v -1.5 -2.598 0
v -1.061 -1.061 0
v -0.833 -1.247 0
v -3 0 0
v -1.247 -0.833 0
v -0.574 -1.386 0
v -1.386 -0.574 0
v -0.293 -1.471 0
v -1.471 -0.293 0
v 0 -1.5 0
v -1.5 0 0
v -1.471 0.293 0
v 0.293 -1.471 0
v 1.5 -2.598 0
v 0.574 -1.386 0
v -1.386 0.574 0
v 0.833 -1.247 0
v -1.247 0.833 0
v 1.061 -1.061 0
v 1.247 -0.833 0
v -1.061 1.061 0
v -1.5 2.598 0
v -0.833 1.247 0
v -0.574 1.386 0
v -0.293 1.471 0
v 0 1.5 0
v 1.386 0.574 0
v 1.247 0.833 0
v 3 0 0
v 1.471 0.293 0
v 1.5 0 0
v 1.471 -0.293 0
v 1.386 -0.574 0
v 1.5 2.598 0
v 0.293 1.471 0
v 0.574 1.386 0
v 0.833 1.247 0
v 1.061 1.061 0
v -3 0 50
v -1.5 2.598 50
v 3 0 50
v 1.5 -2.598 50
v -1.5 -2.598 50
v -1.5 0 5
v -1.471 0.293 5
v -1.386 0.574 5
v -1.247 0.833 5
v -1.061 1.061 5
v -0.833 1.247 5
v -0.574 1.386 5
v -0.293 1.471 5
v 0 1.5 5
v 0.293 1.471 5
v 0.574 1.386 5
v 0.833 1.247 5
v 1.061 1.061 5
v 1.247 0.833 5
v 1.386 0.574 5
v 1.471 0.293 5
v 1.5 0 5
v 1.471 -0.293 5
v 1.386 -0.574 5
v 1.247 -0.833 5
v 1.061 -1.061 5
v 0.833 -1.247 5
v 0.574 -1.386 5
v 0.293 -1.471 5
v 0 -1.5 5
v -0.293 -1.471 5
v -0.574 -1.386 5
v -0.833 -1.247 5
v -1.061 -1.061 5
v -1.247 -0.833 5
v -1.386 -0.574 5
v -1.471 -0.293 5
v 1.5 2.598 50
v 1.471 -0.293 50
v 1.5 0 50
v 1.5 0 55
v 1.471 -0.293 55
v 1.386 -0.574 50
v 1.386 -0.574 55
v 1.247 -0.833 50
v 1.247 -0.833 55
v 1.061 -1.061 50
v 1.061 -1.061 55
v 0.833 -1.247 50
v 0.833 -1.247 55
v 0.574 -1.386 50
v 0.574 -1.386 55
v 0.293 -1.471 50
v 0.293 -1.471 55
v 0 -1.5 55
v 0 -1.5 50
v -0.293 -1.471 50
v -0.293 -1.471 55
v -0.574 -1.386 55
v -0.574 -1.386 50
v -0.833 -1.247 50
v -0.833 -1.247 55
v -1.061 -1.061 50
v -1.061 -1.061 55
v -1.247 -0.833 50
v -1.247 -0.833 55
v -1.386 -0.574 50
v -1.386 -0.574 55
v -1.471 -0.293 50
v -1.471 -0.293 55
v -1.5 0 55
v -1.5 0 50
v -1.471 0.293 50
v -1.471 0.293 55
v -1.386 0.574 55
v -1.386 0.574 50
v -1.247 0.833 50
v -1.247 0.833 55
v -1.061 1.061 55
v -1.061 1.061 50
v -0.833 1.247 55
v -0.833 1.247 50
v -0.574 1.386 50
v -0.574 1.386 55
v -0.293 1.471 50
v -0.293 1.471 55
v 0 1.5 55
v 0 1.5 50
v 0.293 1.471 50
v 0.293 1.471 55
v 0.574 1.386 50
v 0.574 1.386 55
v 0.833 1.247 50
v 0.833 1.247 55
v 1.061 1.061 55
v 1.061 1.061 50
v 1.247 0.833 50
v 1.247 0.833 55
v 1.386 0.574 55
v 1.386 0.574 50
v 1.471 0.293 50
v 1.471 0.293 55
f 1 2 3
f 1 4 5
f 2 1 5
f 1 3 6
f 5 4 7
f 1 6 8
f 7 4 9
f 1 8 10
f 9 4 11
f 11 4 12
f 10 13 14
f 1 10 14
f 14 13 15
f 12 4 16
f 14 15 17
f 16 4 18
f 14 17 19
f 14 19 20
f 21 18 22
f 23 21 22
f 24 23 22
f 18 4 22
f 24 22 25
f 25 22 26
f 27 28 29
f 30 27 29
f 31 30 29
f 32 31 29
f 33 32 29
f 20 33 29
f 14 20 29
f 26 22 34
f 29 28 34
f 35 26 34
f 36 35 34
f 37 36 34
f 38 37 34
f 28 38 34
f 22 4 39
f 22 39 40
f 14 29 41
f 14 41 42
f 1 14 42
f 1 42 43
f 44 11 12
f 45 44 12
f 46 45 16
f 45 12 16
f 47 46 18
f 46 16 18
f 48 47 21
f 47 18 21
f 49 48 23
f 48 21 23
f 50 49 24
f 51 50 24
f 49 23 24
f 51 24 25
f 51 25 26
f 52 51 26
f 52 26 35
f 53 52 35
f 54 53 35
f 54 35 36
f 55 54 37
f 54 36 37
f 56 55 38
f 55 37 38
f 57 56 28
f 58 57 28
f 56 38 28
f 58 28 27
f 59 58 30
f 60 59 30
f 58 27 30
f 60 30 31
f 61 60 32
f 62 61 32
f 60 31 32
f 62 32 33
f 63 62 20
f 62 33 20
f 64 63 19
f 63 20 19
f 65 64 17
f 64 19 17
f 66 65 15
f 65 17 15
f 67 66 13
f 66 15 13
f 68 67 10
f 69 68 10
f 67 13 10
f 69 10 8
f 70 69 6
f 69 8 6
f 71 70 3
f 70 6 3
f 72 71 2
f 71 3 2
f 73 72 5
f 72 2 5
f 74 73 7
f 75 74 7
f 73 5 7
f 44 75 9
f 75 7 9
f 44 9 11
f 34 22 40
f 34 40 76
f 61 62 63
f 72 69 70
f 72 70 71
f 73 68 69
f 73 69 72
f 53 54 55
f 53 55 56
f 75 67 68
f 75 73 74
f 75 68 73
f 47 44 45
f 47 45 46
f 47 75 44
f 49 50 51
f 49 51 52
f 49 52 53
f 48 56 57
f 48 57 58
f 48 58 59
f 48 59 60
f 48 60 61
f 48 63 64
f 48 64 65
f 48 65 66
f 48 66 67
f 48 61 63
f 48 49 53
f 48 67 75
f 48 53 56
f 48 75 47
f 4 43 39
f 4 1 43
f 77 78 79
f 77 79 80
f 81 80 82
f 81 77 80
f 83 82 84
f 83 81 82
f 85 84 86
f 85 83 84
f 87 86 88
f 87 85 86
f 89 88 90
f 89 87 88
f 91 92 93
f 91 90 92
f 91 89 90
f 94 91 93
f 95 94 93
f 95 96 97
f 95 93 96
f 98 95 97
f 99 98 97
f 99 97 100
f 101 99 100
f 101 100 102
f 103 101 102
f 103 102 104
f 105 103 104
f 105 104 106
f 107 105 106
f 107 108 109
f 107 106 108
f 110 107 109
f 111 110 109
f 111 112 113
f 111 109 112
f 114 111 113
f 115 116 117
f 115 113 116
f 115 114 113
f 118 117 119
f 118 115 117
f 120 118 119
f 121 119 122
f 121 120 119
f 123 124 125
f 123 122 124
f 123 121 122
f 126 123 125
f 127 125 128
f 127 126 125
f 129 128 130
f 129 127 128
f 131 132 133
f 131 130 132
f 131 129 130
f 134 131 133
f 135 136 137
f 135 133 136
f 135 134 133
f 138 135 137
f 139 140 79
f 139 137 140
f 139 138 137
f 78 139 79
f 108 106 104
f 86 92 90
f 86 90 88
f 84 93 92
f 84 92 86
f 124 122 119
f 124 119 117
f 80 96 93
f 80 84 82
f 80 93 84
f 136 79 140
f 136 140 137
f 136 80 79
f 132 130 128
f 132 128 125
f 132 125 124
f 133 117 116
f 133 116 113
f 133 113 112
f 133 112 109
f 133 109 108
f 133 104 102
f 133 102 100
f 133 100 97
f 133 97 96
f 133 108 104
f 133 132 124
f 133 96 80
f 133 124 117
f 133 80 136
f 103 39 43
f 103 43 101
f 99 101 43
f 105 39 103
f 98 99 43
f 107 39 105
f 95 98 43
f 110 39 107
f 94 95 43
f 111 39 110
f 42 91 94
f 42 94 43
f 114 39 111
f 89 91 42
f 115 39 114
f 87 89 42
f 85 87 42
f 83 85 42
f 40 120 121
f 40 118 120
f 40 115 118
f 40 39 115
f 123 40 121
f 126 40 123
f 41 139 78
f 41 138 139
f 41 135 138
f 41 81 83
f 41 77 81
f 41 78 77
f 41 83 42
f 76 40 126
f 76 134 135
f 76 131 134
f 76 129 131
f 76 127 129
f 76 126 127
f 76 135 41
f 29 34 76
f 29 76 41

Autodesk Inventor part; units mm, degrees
ref_plane "YZ Plane" through (0, 0, 0) normal (1, 0, 0) x (0, 1, 0)
ref_plane "XZ Plane" through (0, 0, 0) normal (0, 1, 0) x (-1, 0, 0)
ref_plane "XY Plane" through (0, 0, 0) normal (0, 0, 1) x (1, 0, 0)
sketch "스케치1" plane through (0, 0, 0) normal (0, 0, 1) x (1, 0, 0)
  line L0 (-3, 0) -> (-1.5, 2.5981)
  line L1 (-1.5, 2.5981) -> (1.5, 2.5981)
  line L2 (1.5, 2.5981) -> (3, 0)
  line L3 (3, 0) -> (1.5, -2.5981)
  line L4 (1.5, -2.5981) -> (-1.5, -2.5981)
  line L5 (-1.5, -2.5981) -> (-3, 0)
  point P0 (0, 0)
  point P1 (0, 0)
  dimension "d0" = 6
extrude "돌출1" add sketch "스케치1" along normal blind 50
sketch "스케치2" plane through (0, 0, 50) normal (0, 0, 1) x (1, 0, 0)
  circle A0 centre (0, 0) radius 1.5
  dimension "d3" = 3
extrude "돌출2" add sketch "스케치2" along normal blind 5
sketch "스케치3" plane through (0, 0, 0) normal (0, 0, -1) x (-1, 0, 0)
  circle A0 centre (0, 0) radius 1.5
  dimension "d6" = 3
extrude "돌출3" cut sketch "스케치3" against normal blind 5
properties part number "50mm지지대"
